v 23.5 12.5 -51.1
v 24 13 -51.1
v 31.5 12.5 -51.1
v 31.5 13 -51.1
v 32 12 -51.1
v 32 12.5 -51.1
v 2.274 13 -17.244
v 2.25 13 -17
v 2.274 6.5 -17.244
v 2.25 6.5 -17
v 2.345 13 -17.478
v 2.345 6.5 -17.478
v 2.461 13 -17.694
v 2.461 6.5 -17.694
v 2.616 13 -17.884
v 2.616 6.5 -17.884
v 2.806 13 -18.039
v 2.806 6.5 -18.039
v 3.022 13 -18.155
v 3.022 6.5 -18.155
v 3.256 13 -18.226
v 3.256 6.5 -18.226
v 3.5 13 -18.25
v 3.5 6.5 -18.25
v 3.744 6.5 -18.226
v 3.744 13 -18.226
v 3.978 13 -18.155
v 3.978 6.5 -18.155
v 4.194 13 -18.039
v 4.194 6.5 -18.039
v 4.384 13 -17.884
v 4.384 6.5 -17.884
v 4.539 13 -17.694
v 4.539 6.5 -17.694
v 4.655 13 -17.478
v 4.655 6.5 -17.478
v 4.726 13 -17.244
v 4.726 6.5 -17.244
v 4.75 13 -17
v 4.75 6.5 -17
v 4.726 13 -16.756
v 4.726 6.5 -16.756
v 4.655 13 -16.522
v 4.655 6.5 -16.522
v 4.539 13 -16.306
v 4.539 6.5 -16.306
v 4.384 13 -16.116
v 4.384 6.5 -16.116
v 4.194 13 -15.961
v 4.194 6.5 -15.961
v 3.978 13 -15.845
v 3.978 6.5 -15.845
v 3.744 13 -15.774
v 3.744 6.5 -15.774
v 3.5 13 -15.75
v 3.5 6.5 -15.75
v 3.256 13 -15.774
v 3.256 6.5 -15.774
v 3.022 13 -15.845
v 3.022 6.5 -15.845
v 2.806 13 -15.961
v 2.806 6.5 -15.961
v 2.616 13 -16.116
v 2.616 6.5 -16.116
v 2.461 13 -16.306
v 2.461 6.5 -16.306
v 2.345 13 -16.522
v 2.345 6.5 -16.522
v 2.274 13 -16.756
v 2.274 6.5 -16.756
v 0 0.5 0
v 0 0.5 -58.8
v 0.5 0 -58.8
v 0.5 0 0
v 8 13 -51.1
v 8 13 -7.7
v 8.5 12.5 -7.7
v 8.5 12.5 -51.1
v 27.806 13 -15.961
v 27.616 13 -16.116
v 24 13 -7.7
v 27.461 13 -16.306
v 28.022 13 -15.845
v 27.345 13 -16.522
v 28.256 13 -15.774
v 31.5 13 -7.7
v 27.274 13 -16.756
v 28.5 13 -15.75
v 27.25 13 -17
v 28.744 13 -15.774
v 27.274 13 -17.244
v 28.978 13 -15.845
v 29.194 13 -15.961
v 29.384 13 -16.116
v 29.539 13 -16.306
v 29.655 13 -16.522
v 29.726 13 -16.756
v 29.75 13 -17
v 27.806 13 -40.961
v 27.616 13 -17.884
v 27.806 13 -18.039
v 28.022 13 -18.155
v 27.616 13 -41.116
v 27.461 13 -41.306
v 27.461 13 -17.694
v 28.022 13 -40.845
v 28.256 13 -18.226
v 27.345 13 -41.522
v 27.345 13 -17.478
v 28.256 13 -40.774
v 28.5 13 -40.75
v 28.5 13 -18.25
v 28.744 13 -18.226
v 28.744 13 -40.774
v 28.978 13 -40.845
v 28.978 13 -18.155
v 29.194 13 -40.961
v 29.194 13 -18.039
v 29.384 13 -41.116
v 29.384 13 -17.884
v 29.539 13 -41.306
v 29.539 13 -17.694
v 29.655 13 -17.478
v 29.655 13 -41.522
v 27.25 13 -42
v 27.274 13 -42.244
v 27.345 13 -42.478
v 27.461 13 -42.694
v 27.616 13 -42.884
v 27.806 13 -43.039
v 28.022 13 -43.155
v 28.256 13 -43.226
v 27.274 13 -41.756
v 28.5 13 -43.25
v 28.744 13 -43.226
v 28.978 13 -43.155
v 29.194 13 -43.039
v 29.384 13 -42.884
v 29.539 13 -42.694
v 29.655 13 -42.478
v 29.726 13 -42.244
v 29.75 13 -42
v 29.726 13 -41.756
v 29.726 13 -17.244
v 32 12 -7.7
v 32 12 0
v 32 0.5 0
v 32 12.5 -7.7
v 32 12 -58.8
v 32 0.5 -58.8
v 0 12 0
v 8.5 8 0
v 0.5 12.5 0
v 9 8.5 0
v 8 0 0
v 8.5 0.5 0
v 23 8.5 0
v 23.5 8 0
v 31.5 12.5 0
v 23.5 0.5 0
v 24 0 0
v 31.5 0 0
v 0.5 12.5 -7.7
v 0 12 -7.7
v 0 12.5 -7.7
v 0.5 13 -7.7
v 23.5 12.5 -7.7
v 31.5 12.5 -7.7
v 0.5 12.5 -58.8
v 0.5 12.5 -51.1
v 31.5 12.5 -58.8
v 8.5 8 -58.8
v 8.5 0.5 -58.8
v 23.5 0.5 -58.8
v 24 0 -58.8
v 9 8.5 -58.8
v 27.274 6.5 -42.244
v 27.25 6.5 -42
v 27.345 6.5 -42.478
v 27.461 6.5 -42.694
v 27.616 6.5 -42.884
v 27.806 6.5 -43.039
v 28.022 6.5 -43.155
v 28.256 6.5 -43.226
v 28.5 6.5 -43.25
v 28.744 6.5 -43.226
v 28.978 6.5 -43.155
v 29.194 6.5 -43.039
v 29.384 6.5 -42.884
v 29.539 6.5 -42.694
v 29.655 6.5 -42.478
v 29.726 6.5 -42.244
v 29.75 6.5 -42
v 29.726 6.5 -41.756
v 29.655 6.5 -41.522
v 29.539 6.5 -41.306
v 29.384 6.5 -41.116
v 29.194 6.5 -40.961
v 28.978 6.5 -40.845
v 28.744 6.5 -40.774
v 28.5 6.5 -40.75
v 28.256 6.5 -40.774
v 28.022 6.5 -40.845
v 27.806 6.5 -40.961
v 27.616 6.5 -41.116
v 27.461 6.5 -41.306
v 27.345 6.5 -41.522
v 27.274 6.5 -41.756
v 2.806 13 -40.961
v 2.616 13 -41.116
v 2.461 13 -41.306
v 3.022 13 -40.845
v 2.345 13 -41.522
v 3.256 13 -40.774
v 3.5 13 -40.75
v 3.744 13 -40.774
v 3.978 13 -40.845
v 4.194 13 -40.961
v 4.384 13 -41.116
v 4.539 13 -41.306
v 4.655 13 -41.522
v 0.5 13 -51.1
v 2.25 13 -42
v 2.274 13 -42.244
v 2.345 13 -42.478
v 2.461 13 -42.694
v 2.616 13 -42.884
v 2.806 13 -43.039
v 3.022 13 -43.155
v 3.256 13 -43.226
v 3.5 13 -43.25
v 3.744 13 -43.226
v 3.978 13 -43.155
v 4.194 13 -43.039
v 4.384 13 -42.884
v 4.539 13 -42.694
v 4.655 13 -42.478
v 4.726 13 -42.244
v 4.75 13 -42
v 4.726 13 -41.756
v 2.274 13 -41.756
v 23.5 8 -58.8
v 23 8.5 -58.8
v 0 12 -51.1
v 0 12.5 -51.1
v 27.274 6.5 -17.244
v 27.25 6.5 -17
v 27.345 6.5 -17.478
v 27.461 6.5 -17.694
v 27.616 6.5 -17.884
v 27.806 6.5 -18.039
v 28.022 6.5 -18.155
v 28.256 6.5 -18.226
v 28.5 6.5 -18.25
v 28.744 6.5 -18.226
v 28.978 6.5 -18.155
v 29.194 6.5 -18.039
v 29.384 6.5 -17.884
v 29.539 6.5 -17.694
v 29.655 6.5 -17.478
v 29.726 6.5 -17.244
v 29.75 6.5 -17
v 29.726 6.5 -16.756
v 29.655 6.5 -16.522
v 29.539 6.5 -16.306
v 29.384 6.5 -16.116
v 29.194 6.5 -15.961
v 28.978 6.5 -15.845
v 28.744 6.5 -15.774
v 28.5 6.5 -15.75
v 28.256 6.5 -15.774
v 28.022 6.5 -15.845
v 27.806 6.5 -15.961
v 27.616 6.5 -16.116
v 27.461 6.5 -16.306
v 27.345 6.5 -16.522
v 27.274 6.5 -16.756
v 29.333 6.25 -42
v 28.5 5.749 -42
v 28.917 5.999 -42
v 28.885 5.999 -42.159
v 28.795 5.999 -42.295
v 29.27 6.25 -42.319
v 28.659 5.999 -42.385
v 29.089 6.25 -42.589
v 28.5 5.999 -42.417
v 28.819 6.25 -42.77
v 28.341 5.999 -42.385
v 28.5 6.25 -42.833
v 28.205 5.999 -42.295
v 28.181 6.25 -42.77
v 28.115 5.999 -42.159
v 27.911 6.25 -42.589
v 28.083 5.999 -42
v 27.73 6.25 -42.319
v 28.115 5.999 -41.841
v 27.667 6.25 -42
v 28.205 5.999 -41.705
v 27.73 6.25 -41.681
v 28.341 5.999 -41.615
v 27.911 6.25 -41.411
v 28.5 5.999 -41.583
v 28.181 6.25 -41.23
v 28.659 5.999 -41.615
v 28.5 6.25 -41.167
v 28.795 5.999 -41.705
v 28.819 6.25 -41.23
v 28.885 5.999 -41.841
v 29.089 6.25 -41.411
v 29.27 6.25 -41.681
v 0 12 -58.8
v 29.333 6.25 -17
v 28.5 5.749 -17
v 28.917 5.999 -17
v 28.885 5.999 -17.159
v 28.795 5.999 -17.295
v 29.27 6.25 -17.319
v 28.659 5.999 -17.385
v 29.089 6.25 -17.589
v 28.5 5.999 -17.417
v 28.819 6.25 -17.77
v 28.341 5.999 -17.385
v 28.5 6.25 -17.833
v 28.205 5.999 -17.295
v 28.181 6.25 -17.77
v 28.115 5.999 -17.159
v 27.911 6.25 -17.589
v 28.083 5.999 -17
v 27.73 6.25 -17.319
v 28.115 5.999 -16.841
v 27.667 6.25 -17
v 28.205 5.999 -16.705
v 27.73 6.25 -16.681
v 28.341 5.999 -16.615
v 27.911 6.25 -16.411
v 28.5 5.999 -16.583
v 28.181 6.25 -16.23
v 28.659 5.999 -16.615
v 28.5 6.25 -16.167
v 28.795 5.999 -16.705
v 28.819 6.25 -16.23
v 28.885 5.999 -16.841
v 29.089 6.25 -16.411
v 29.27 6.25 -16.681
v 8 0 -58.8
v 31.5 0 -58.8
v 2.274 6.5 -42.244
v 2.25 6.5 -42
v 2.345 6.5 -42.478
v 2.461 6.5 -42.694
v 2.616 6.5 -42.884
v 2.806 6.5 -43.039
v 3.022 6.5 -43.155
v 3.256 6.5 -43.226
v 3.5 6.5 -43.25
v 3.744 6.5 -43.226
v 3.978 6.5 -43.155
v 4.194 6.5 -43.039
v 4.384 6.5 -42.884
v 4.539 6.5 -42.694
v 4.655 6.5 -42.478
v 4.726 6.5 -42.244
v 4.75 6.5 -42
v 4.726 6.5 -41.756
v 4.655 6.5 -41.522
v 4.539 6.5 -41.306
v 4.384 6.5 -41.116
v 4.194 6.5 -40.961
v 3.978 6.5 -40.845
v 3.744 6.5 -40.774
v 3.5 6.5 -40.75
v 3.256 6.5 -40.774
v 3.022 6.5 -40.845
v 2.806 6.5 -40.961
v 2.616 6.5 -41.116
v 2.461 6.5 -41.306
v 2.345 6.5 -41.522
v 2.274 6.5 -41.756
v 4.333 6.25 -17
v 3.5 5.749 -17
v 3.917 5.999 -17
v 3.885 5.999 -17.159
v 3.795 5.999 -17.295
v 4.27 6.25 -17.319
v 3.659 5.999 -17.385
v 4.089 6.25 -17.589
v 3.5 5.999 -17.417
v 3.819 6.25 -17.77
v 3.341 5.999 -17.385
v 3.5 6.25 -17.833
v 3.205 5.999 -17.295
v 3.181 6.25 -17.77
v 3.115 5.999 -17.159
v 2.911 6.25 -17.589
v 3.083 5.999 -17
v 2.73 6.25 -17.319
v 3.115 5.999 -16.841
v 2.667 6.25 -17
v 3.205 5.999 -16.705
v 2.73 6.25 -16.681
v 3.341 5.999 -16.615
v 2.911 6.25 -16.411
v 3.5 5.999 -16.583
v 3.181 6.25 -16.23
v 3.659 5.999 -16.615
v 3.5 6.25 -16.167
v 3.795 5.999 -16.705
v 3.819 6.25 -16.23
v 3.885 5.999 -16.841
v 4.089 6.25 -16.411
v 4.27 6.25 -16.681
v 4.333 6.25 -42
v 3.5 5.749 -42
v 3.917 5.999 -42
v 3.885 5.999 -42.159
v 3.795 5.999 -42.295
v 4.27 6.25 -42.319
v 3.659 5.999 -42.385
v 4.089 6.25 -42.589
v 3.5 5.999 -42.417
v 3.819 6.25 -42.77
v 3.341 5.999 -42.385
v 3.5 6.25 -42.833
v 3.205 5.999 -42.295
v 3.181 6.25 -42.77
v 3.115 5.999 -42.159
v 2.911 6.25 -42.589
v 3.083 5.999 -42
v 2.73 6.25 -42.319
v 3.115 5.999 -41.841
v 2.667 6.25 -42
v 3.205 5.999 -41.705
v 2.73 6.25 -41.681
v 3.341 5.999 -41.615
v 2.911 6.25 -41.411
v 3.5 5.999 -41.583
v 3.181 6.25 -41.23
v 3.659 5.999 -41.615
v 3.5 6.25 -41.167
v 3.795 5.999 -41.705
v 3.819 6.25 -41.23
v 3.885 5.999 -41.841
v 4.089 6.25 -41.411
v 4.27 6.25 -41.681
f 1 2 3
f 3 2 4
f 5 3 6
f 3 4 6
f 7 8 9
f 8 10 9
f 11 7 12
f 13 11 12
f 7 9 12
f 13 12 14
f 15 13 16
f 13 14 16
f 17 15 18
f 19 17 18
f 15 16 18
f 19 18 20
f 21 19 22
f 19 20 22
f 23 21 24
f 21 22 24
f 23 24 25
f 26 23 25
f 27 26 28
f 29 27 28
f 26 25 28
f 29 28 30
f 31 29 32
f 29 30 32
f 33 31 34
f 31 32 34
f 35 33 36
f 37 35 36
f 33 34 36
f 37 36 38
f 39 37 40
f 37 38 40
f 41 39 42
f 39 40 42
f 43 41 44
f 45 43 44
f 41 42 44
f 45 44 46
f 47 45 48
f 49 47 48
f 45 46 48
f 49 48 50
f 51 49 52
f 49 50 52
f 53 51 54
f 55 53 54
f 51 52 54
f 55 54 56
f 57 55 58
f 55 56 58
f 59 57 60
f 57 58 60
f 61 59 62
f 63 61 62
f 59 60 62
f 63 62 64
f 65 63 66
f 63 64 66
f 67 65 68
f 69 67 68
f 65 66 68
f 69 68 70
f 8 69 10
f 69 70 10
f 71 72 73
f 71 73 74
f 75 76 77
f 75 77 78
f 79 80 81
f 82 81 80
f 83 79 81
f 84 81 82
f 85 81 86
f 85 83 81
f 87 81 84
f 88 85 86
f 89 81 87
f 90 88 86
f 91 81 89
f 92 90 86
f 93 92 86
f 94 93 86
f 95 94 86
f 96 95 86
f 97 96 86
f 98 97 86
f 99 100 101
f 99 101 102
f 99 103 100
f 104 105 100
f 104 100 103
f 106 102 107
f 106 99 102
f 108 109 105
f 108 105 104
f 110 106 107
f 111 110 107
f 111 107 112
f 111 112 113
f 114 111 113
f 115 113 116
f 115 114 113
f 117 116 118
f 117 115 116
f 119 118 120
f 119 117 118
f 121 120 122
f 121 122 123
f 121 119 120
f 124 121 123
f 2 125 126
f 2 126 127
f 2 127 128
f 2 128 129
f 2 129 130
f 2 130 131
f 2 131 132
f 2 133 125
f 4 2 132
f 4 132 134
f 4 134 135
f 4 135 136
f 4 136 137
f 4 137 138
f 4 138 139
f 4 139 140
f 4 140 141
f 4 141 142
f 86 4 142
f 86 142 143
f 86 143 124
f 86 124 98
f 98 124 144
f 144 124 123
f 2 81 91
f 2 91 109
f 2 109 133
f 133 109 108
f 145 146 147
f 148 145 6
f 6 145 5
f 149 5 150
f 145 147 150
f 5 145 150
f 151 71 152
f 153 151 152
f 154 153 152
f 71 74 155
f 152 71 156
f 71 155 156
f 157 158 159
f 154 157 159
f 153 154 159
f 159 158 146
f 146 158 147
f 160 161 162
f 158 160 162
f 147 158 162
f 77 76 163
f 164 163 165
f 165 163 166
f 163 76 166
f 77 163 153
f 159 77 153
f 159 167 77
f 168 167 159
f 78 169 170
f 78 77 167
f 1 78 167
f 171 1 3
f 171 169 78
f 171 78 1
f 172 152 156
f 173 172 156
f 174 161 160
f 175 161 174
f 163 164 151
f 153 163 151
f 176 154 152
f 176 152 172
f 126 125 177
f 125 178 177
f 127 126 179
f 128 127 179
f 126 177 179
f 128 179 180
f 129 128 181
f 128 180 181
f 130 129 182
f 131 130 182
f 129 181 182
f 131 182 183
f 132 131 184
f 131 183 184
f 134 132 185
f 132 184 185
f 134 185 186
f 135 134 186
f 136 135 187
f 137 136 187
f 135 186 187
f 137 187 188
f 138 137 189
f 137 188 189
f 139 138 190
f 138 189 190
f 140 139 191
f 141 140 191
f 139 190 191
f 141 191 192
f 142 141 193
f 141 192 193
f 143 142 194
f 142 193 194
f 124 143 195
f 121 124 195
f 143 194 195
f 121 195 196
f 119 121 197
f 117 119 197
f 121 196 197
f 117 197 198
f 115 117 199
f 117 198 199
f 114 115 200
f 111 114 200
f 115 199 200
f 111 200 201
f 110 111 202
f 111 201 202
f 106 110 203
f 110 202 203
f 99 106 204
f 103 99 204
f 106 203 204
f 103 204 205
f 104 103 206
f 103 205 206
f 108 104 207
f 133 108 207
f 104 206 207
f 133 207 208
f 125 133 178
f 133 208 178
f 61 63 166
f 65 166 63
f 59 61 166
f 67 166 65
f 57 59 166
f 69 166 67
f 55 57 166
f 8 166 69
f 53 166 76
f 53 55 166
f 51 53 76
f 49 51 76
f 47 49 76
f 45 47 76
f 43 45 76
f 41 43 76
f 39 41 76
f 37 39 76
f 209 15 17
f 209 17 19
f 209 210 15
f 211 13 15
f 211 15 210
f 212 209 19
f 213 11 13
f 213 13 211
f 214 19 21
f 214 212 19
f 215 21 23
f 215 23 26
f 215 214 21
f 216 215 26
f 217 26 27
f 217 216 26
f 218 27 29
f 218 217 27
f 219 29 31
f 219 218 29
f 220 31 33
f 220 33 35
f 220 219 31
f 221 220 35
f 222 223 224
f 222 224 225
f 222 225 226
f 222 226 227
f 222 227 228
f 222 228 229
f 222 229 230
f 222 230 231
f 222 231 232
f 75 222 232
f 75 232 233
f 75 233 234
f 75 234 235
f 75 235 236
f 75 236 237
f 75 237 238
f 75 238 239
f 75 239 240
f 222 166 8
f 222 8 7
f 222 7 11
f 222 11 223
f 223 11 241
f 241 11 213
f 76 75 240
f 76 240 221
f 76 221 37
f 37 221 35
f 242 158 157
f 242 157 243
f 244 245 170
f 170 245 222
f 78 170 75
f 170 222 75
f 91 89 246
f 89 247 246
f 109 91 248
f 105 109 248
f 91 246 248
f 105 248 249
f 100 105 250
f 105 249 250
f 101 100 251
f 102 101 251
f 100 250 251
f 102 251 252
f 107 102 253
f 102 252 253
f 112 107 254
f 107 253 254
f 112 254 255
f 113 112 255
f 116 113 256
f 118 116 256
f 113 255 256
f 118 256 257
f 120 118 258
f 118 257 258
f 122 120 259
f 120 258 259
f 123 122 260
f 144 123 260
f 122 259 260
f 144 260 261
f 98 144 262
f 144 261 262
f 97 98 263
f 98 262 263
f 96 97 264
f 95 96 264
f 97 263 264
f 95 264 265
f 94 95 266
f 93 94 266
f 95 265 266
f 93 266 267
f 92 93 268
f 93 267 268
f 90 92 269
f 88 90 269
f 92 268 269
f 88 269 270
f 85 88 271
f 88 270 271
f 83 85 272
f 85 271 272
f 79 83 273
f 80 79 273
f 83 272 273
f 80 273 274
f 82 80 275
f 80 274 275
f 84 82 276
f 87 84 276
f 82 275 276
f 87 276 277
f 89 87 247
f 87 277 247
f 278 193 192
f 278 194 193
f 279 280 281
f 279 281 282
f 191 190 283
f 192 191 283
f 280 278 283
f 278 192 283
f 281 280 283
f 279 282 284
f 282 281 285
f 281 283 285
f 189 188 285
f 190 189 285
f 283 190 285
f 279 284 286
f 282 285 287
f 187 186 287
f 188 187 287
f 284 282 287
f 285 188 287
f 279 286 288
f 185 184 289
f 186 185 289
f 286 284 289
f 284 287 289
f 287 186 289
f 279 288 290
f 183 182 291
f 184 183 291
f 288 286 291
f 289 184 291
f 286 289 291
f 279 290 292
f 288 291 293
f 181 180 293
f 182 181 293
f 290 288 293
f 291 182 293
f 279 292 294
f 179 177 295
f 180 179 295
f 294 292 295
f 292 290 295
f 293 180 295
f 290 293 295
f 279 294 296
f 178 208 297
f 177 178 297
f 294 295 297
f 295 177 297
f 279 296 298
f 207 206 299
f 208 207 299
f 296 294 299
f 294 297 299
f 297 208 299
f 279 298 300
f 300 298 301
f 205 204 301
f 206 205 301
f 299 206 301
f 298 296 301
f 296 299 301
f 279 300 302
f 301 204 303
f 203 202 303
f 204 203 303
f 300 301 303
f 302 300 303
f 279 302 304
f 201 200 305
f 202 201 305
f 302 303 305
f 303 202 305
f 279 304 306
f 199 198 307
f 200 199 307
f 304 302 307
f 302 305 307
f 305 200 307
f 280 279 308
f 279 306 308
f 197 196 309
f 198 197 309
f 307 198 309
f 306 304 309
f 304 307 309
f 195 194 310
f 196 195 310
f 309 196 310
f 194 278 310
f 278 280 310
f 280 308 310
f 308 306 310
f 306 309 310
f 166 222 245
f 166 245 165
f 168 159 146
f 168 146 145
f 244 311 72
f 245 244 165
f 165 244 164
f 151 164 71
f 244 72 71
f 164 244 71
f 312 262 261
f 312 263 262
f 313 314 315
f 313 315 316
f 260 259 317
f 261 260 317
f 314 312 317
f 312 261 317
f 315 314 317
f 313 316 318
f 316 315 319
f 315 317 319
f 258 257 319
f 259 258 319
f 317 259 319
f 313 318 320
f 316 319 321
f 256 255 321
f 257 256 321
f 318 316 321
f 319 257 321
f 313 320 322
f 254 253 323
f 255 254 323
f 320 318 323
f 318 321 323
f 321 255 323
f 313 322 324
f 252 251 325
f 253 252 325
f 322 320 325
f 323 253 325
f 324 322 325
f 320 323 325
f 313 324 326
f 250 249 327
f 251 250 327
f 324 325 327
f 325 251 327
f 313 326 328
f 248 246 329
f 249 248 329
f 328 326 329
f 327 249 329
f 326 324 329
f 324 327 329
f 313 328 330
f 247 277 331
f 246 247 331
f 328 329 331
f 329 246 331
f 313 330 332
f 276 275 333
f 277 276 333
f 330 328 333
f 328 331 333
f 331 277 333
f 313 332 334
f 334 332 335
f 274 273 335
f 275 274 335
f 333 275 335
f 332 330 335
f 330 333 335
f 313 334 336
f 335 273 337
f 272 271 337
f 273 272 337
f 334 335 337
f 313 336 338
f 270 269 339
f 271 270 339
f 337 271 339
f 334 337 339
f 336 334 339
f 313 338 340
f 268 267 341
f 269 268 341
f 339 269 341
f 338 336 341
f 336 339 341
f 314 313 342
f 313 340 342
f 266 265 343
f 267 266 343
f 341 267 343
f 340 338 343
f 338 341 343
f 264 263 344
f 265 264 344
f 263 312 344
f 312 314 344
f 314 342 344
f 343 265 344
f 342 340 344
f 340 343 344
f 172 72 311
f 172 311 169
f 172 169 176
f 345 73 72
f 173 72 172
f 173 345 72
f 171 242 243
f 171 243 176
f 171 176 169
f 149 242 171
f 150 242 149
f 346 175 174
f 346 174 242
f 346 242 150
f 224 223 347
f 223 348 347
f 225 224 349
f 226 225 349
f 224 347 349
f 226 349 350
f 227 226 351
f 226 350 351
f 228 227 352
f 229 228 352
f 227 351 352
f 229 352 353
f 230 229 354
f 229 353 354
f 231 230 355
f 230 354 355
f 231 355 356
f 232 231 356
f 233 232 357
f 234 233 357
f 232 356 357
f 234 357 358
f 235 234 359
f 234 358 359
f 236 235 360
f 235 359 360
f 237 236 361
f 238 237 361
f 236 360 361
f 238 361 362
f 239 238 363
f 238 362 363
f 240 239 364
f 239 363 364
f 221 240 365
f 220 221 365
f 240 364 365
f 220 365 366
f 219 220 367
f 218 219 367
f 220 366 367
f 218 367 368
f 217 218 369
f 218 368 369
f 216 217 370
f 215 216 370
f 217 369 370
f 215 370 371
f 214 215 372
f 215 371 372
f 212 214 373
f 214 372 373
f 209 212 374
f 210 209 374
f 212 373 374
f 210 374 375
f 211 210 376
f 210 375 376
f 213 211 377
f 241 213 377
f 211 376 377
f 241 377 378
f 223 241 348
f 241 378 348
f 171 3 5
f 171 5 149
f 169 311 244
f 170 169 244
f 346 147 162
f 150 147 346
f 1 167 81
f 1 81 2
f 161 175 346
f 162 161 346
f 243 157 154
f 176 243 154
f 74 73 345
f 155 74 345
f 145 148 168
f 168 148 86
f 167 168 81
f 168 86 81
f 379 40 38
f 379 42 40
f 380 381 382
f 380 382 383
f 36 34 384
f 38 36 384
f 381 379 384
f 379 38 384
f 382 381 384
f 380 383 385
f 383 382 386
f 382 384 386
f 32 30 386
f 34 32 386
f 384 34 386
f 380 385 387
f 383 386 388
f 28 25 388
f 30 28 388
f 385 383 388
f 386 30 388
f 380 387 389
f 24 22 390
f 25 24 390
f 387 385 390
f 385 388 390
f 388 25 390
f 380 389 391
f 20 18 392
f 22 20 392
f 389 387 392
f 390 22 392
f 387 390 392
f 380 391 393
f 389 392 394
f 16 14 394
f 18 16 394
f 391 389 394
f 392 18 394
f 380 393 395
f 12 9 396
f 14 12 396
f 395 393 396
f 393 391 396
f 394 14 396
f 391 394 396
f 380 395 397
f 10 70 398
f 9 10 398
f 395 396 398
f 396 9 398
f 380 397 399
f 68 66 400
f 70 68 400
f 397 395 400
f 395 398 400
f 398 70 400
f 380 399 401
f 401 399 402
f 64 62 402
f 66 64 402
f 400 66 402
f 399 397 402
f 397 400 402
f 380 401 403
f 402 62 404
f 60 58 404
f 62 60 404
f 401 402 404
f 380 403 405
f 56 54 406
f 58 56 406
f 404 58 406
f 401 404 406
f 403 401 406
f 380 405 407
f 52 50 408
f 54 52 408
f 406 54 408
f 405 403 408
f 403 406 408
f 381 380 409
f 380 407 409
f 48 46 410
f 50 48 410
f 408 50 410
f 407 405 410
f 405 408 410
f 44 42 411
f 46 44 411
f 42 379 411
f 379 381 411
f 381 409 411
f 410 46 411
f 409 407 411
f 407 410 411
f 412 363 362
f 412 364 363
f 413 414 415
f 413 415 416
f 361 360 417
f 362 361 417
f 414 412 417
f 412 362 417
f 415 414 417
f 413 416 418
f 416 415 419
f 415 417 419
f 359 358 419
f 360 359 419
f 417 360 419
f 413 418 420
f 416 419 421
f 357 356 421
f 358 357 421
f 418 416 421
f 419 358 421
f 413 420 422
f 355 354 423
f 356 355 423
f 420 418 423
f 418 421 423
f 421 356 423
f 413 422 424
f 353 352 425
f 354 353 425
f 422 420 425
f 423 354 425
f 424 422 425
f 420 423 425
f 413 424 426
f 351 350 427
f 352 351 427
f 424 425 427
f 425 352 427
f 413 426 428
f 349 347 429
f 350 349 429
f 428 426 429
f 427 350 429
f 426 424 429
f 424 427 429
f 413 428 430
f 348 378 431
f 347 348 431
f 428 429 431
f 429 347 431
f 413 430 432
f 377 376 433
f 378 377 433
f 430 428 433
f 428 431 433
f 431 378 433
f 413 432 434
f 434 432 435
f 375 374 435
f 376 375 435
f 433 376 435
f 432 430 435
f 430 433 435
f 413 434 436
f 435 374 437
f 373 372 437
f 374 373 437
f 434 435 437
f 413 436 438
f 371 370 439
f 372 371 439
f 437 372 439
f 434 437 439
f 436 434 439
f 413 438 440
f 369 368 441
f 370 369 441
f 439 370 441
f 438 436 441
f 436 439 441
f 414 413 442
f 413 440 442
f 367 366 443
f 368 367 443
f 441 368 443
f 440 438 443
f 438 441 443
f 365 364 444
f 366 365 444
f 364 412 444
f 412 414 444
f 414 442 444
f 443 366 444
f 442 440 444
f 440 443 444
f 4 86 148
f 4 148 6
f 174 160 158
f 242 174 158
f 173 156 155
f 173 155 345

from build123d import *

# Parameters (mm, degrees)
SKETCH1_W                 = 32
SKETCH1_H                 = 43.4
SKETCH1_H_2               = 7.7
BOSS_EXTRUDE1_DEPTH       = 13
M3X0_5_TAPPED_HOLE1_D     = 2.5
M3X0_5_TAPPED_HOLE1_DEPTH = 6.5
M3X0_5_TAPPED_HOLE1_TIP   = 0.751075774
CUT_EXTRUDE1_DEPTH        = 69.194134645
SKETCH5_W                 = 15
SKETCH5_H                 = 43.4
CUT_EXTRUDE2_DEPTH        = 0.5
CHAMFER1_SIZE             = 0.5


with BuildPart() as part:
    # Sketch1 → Boss-Extrude1 (new body)
    with BuildSketch(Plane(origin=(0, 0, 0), x_dir=(1, 0, 0), z_dir=(0, 1, 0))):
        with Locations((16, 29.4)):
            Rectangle(SKETCH1_W, SKETCH1_H)
        with Locations((16, 3.85)):
            Rectangle(SKETCH1_W, SKETCH1_H_2)
        with Locations((16, 54.95)):
            Rectangle(SKETCH1_W, SKETCH1_H_2)
    extrude(amount=BOSS_EXTRUDE1_DEPTH)

    # M3x0.5 Tapped Hole1
    with Locations(Plane(origin=(0, 13, 0), x_dir=(1, 0, 0), z_dir=(0, 1, 0))):
        with Locations((28.5, 17), (28.5, 42), (3.5, 42), (3.5, 17)):
            Hole(M3X0_5_TAPPED_HOLE1_D / 2, depth=M3X0_5_TAPPED_HOLE1_DEPTH)
            with Locations((0, 0, -(M3X0_5_TAPPED_HOLE1_DEPTH + M3X0_5_TAPPED_HOLE1_TIP / 2))):  # 118° drill point
                Cone(0, M3X0_5_TAPPED_HOLE1_D / 2, M3X0_5_TAPPED_HOLE1_TIP, mode=Mode.SUBTRACT)

    # Sketch4 → Cut-Extrude1 (cut, through all)
    with BuildSketch(Plane.XY):
        Polygon((8.5, 8.5), (8.5, 0), (23.5, 0), (23.5, 8.5), (16, 8.5), align=None)
    extrude(amount=-CUT_EXTRUDE1_DEPTH, mode=Mode.SUBTRACT)

    # Sketch5 → Cut-Extrude2 (cut)
    with BuildSketch(Plane(origin=(0, 13, 0), x_dir=(1, 0, 0), z_dir=(0, 1, 0))):
        Polygon((0, 58.8), (0, 51.1), (8.5, 51.1), (23.5, 51.1), (32, 51.1), (32, 58.8), align=None)
        Polygon((8.5, 7.7), (0, 7.7), (0, 0), (32, 0), (32, 7.7), (23.5, 7.7), align=None)
        with Locations((16, 29.4)):
            Rectangle(SKETCH5_W, SKETCH5_H)
    extrude(amount=-CUT_EXTRUDE2_DEPTH, mode=Mode.SUBTRACT)

    # Chamfer1
    chamfer1_edges = [part.edges().sort_by_distance(p)[0] for p in [
        (0, 13, -29.4),
        (8.5, 13, -29.4),
        (0, 12.5, -3.85),
        (0, 12.5, -54.95),
        (0, 0, -29.4),
        (32, 12.5, -3.85),
        (32, 12.5, -54.95),
        (8.5, 0, -29.4),
        (8.5, 8.5, -29.4),
        (23.5, 8.5, -29.4),
        (23.5, 0, -29.4),
        (32, 0, -29.4),
        (32, 13, -29.4),
        (23.5, 13, -29.4),
    ]]
    chamfer(chamfer1_edges, length=CHAMFER1_SIZE - 0.0001)  # a hair under: the kernel refuses the full size


solid = part.part
